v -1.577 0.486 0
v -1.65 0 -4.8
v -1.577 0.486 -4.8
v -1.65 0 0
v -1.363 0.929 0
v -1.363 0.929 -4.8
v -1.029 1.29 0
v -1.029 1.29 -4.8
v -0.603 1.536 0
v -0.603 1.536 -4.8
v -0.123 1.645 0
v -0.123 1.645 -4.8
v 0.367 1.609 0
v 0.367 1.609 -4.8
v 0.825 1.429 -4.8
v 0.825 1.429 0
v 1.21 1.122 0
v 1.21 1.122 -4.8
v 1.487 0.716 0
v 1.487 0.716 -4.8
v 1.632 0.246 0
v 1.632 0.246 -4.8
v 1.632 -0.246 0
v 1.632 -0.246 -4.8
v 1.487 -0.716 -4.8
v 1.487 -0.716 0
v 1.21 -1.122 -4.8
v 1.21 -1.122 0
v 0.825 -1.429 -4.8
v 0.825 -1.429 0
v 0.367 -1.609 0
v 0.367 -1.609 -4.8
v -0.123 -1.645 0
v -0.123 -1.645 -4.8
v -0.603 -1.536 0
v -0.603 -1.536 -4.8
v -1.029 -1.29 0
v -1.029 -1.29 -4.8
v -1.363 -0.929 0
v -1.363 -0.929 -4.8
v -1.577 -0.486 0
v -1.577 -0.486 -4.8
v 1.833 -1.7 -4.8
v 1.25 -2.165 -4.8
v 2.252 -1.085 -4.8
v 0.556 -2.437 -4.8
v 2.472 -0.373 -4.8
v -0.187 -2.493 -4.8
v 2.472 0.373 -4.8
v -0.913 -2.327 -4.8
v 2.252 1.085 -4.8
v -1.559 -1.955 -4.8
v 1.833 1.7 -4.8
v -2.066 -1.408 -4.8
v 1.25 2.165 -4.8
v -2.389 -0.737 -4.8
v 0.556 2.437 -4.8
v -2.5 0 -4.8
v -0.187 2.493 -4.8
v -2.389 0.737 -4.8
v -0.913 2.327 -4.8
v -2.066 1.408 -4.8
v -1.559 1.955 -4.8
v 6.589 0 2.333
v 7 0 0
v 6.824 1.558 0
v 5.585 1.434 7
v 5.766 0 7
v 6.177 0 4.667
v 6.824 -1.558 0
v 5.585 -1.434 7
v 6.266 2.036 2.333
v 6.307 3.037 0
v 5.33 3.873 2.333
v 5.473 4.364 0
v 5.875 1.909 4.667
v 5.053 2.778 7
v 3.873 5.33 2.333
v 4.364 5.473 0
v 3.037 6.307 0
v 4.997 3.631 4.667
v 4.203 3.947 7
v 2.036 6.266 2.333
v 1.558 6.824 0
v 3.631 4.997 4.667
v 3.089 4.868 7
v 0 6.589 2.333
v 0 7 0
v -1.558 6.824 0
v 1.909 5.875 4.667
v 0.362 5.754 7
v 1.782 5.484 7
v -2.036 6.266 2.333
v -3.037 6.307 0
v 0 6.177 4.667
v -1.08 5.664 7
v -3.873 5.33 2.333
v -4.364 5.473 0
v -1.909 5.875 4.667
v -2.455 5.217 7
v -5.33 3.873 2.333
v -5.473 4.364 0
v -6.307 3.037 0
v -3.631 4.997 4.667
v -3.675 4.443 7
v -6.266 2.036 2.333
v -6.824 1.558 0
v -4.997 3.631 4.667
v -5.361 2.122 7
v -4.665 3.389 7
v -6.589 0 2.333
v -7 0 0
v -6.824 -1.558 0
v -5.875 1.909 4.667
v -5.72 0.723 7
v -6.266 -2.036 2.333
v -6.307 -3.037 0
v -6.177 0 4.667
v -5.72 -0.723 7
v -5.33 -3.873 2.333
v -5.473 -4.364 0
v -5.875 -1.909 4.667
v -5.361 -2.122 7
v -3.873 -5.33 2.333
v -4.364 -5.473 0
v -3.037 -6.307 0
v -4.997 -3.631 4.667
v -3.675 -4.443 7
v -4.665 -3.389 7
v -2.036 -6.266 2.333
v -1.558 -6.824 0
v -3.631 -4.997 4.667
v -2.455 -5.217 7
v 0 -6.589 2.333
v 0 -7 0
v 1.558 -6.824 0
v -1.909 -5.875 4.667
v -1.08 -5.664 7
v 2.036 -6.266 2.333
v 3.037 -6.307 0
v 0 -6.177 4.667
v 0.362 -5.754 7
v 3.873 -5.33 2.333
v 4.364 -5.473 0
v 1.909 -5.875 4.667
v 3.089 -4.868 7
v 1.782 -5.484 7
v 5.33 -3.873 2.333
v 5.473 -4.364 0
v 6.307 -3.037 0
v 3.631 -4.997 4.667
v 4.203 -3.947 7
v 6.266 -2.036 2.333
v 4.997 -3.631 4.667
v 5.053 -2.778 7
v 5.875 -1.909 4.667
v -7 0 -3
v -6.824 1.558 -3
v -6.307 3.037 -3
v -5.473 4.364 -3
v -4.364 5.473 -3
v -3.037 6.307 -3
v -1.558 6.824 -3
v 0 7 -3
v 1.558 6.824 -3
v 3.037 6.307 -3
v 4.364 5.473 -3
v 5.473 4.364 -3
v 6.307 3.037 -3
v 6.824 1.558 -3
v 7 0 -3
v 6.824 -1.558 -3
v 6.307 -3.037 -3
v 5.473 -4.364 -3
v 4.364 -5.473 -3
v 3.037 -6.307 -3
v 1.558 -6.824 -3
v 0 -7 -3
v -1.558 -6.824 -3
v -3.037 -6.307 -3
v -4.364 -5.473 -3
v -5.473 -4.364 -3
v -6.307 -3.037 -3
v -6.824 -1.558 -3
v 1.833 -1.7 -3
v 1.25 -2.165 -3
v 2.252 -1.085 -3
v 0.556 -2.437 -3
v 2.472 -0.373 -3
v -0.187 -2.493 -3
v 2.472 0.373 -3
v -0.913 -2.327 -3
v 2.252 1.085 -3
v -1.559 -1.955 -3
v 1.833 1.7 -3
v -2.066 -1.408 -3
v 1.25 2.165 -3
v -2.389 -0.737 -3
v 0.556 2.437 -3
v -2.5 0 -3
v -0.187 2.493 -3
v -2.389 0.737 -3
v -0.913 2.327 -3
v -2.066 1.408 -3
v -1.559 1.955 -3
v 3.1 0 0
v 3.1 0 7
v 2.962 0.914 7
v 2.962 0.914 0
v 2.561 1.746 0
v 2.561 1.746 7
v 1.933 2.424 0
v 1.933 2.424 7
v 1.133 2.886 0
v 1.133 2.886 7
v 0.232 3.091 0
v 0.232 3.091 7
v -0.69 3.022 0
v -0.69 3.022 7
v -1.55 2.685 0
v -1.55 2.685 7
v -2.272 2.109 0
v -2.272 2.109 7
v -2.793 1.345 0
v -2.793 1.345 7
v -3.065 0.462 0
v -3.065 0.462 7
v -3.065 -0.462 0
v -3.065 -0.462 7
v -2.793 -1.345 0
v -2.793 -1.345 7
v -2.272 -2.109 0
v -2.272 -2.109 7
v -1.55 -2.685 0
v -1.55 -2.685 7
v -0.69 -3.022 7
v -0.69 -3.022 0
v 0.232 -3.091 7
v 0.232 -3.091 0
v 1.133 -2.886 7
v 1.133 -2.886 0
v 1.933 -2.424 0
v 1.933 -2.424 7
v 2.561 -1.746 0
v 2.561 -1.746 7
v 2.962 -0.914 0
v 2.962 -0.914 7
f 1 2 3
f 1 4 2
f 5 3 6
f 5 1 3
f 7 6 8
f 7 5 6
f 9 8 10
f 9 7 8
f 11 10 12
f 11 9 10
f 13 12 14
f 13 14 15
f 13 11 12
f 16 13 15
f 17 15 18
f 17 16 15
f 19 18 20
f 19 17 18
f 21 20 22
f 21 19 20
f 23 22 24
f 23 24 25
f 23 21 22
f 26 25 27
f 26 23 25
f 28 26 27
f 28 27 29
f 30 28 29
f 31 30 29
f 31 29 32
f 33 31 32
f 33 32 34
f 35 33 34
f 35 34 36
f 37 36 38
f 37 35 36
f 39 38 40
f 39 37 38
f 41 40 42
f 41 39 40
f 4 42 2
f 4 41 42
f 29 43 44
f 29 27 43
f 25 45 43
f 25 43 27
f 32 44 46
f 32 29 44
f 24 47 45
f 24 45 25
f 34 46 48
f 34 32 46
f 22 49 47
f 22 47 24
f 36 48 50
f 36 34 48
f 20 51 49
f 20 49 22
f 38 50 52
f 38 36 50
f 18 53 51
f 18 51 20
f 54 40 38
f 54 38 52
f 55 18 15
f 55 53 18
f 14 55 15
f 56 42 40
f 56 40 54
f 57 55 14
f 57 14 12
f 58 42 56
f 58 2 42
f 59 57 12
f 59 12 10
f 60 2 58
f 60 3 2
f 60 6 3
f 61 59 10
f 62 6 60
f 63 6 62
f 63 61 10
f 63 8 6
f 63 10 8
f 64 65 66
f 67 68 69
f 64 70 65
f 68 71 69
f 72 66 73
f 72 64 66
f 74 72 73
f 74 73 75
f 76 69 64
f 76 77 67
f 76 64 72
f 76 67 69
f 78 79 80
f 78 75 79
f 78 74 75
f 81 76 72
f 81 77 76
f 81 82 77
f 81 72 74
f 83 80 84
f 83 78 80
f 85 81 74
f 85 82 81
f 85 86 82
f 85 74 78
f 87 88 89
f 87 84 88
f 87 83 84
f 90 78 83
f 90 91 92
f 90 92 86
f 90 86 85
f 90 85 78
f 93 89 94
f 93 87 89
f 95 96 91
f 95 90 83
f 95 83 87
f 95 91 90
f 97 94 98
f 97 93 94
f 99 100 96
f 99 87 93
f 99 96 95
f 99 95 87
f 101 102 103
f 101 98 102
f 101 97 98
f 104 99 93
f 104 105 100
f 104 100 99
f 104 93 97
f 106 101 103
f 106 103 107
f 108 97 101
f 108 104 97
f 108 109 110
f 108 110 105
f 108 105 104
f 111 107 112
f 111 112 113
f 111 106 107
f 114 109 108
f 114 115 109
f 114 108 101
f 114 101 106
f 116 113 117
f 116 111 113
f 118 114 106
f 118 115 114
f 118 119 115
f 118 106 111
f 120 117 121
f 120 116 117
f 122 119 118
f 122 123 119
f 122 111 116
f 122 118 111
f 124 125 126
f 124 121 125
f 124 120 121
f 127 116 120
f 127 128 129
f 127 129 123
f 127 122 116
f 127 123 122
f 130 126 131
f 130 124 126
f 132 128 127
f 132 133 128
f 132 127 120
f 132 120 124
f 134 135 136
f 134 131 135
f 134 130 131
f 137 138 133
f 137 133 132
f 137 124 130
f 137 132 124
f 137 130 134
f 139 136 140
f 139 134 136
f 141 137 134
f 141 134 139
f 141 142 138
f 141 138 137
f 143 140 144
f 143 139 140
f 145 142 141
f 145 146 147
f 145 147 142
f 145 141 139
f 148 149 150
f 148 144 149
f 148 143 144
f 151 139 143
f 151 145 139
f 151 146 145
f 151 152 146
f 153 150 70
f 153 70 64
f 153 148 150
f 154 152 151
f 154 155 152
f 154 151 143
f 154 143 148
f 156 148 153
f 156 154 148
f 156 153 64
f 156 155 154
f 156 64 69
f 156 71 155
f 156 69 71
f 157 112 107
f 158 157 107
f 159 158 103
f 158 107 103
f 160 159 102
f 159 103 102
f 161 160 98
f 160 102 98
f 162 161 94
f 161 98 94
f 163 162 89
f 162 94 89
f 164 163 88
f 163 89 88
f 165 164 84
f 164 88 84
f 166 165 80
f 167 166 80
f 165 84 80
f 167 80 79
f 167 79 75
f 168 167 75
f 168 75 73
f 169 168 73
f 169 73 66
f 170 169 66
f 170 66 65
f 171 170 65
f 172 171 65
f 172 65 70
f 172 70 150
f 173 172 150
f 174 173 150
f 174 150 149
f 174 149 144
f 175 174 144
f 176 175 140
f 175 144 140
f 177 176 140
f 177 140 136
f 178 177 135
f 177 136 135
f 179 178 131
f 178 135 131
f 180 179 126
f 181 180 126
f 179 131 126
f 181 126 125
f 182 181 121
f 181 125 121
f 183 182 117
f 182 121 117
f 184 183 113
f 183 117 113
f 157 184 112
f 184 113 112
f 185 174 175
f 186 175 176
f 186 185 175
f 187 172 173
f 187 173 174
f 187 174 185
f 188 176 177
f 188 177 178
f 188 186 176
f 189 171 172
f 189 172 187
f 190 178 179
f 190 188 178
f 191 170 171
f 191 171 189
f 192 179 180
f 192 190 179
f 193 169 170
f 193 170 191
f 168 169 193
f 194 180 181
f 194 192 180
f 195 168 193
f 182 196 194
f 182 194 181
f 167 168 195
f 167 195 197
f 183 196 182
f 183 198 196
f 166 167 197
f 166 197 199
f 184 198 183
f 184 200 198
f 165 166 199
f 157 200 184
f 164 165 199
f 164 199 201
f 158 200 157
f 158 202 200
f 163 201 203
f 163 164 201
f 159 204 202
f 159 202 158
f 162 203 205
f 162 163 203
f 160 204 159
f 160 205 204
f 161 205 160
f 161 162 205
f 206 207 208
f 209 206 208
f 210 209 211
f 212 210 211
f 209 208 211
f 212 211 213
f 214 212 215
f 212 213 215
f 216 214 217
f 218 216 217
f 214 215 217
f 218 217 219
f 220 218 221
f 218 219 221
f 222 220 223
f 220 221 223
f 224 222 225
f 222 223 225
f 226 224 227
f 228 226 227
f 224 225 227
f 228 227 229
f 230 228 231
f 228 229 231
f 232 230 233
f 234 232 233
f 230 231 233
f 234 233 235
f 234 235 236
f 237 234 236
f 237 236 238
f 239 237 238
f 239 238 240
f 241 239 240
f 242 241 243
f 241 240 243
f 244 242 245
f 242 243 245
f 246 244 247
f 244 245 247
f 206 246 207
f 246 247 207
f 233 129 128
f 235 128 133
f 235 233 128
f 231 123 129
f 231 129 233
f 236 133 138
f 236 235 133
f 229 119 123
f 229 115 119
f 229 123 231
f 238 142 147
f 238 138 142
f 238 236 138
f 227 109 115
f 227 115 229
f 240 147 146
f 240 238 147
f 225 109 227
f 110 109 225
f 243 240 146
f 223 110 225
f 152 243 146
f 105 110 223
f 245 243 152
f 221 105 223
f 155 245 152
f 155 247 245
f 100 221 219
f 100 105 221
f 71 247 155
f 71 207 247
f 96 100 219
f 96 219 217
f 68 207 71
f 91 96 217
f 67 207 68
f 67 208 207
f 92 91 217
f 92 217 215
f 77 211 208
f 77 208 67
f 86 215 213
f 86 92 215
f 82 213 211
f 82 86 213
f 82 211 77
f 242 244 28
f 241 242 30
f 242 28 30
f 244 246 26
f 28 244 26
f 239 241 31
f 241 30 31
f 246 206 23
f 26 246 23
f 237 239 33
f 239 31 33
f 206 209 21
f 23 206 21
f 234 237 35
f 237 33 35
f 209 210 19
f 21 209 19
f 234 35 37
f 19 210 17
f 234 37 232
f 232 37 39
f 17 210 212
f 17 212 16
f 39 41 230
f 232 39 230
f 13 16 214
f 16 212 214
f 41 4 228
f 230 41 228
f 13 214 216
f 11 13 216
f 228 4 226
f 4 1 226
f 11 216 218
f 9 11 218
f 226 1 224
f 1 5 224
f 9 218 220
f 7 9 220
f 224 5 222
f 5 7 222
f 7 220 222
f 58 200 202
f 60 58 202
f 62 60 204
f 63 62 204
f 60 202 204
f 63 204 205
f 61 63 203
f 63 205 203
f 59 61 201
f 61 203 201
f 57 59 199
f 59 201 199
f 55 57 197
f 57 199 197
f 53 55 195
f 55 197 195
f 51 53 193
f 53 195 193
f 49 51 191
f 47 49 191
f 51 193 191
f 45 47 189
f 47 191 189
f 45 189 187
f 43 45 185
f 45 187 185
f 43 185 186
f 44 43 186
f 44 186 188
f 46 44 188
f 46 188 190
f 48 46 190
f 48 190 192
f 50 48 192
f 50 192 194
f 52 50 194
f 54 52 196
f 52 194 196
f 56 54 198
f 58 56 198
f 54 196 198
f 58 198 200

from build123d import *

# Parameters (mm, degrees)
SKETCH1_R           = 7
BOSS_EXTRUDE1_DEPTH = 7
BOSS_EXTRUDE1_TAPER = 10
SKETCH2_R           = 3.1
CUT_EXTRUDE1_DEPTH  = 7
SKETCH3_R           = 7
SKETCH3_R_2         = 1.65
BOSS_EXTRUDE2_DEPTH = 3
SKETCH4_R           = 2.5
SKETCH4_R_2         = 1.65
BOSS_EXTRUDE3_DEPTH = 1.8


with BuildPart() as part:
    # Sketch1 → Boss-Extrude1 (new body)
    with BuildSketch(Plane.XY):
        Circle(SKETCH1_R)
    extrude(amount=BOSS_EXTRUDE1_DEPTH, taper=BOSS_EXTRUDE1_TAPER)

    # Sketch2 → Cut-Extrude1 (cut)
    with BuildSketch(Plane.XY.offset(7)):
        Circle(SKETCH2_R)
    extrude(amount=-CUT_EXTRUDE1_DEPTH, mode=Mode.SUBTRACT)

    # Sketch3 → Boss-Extrude2 (add)
    with BuildSketch(Plane(origin=(0, 0, 0), x_dir=(-1, 0, 0), z_dir=(0, 0, -1))):
        Circle(SKETCH3_R)
        Circle(SKETCH3_R_2, mode=Mode.SUBTRACT)
    extrude(amount=BOSS_EXTRUDE2_DEPTH)

    # Sketch4 → Boss-Extrude3 (add)
    with BuildSketch(Plane(origin=(0, 0, -3), x_dir=(-1, 0, 0), z_dir=(0, 0, -1))):
        Circle(SKETCH4_R)
        Circle(SKETCH4_R_2, mode=Mode.SUBTRACT)
    extrude(amount=BOSS_EXTRUDE3_DEPTH)


solid = part.part
